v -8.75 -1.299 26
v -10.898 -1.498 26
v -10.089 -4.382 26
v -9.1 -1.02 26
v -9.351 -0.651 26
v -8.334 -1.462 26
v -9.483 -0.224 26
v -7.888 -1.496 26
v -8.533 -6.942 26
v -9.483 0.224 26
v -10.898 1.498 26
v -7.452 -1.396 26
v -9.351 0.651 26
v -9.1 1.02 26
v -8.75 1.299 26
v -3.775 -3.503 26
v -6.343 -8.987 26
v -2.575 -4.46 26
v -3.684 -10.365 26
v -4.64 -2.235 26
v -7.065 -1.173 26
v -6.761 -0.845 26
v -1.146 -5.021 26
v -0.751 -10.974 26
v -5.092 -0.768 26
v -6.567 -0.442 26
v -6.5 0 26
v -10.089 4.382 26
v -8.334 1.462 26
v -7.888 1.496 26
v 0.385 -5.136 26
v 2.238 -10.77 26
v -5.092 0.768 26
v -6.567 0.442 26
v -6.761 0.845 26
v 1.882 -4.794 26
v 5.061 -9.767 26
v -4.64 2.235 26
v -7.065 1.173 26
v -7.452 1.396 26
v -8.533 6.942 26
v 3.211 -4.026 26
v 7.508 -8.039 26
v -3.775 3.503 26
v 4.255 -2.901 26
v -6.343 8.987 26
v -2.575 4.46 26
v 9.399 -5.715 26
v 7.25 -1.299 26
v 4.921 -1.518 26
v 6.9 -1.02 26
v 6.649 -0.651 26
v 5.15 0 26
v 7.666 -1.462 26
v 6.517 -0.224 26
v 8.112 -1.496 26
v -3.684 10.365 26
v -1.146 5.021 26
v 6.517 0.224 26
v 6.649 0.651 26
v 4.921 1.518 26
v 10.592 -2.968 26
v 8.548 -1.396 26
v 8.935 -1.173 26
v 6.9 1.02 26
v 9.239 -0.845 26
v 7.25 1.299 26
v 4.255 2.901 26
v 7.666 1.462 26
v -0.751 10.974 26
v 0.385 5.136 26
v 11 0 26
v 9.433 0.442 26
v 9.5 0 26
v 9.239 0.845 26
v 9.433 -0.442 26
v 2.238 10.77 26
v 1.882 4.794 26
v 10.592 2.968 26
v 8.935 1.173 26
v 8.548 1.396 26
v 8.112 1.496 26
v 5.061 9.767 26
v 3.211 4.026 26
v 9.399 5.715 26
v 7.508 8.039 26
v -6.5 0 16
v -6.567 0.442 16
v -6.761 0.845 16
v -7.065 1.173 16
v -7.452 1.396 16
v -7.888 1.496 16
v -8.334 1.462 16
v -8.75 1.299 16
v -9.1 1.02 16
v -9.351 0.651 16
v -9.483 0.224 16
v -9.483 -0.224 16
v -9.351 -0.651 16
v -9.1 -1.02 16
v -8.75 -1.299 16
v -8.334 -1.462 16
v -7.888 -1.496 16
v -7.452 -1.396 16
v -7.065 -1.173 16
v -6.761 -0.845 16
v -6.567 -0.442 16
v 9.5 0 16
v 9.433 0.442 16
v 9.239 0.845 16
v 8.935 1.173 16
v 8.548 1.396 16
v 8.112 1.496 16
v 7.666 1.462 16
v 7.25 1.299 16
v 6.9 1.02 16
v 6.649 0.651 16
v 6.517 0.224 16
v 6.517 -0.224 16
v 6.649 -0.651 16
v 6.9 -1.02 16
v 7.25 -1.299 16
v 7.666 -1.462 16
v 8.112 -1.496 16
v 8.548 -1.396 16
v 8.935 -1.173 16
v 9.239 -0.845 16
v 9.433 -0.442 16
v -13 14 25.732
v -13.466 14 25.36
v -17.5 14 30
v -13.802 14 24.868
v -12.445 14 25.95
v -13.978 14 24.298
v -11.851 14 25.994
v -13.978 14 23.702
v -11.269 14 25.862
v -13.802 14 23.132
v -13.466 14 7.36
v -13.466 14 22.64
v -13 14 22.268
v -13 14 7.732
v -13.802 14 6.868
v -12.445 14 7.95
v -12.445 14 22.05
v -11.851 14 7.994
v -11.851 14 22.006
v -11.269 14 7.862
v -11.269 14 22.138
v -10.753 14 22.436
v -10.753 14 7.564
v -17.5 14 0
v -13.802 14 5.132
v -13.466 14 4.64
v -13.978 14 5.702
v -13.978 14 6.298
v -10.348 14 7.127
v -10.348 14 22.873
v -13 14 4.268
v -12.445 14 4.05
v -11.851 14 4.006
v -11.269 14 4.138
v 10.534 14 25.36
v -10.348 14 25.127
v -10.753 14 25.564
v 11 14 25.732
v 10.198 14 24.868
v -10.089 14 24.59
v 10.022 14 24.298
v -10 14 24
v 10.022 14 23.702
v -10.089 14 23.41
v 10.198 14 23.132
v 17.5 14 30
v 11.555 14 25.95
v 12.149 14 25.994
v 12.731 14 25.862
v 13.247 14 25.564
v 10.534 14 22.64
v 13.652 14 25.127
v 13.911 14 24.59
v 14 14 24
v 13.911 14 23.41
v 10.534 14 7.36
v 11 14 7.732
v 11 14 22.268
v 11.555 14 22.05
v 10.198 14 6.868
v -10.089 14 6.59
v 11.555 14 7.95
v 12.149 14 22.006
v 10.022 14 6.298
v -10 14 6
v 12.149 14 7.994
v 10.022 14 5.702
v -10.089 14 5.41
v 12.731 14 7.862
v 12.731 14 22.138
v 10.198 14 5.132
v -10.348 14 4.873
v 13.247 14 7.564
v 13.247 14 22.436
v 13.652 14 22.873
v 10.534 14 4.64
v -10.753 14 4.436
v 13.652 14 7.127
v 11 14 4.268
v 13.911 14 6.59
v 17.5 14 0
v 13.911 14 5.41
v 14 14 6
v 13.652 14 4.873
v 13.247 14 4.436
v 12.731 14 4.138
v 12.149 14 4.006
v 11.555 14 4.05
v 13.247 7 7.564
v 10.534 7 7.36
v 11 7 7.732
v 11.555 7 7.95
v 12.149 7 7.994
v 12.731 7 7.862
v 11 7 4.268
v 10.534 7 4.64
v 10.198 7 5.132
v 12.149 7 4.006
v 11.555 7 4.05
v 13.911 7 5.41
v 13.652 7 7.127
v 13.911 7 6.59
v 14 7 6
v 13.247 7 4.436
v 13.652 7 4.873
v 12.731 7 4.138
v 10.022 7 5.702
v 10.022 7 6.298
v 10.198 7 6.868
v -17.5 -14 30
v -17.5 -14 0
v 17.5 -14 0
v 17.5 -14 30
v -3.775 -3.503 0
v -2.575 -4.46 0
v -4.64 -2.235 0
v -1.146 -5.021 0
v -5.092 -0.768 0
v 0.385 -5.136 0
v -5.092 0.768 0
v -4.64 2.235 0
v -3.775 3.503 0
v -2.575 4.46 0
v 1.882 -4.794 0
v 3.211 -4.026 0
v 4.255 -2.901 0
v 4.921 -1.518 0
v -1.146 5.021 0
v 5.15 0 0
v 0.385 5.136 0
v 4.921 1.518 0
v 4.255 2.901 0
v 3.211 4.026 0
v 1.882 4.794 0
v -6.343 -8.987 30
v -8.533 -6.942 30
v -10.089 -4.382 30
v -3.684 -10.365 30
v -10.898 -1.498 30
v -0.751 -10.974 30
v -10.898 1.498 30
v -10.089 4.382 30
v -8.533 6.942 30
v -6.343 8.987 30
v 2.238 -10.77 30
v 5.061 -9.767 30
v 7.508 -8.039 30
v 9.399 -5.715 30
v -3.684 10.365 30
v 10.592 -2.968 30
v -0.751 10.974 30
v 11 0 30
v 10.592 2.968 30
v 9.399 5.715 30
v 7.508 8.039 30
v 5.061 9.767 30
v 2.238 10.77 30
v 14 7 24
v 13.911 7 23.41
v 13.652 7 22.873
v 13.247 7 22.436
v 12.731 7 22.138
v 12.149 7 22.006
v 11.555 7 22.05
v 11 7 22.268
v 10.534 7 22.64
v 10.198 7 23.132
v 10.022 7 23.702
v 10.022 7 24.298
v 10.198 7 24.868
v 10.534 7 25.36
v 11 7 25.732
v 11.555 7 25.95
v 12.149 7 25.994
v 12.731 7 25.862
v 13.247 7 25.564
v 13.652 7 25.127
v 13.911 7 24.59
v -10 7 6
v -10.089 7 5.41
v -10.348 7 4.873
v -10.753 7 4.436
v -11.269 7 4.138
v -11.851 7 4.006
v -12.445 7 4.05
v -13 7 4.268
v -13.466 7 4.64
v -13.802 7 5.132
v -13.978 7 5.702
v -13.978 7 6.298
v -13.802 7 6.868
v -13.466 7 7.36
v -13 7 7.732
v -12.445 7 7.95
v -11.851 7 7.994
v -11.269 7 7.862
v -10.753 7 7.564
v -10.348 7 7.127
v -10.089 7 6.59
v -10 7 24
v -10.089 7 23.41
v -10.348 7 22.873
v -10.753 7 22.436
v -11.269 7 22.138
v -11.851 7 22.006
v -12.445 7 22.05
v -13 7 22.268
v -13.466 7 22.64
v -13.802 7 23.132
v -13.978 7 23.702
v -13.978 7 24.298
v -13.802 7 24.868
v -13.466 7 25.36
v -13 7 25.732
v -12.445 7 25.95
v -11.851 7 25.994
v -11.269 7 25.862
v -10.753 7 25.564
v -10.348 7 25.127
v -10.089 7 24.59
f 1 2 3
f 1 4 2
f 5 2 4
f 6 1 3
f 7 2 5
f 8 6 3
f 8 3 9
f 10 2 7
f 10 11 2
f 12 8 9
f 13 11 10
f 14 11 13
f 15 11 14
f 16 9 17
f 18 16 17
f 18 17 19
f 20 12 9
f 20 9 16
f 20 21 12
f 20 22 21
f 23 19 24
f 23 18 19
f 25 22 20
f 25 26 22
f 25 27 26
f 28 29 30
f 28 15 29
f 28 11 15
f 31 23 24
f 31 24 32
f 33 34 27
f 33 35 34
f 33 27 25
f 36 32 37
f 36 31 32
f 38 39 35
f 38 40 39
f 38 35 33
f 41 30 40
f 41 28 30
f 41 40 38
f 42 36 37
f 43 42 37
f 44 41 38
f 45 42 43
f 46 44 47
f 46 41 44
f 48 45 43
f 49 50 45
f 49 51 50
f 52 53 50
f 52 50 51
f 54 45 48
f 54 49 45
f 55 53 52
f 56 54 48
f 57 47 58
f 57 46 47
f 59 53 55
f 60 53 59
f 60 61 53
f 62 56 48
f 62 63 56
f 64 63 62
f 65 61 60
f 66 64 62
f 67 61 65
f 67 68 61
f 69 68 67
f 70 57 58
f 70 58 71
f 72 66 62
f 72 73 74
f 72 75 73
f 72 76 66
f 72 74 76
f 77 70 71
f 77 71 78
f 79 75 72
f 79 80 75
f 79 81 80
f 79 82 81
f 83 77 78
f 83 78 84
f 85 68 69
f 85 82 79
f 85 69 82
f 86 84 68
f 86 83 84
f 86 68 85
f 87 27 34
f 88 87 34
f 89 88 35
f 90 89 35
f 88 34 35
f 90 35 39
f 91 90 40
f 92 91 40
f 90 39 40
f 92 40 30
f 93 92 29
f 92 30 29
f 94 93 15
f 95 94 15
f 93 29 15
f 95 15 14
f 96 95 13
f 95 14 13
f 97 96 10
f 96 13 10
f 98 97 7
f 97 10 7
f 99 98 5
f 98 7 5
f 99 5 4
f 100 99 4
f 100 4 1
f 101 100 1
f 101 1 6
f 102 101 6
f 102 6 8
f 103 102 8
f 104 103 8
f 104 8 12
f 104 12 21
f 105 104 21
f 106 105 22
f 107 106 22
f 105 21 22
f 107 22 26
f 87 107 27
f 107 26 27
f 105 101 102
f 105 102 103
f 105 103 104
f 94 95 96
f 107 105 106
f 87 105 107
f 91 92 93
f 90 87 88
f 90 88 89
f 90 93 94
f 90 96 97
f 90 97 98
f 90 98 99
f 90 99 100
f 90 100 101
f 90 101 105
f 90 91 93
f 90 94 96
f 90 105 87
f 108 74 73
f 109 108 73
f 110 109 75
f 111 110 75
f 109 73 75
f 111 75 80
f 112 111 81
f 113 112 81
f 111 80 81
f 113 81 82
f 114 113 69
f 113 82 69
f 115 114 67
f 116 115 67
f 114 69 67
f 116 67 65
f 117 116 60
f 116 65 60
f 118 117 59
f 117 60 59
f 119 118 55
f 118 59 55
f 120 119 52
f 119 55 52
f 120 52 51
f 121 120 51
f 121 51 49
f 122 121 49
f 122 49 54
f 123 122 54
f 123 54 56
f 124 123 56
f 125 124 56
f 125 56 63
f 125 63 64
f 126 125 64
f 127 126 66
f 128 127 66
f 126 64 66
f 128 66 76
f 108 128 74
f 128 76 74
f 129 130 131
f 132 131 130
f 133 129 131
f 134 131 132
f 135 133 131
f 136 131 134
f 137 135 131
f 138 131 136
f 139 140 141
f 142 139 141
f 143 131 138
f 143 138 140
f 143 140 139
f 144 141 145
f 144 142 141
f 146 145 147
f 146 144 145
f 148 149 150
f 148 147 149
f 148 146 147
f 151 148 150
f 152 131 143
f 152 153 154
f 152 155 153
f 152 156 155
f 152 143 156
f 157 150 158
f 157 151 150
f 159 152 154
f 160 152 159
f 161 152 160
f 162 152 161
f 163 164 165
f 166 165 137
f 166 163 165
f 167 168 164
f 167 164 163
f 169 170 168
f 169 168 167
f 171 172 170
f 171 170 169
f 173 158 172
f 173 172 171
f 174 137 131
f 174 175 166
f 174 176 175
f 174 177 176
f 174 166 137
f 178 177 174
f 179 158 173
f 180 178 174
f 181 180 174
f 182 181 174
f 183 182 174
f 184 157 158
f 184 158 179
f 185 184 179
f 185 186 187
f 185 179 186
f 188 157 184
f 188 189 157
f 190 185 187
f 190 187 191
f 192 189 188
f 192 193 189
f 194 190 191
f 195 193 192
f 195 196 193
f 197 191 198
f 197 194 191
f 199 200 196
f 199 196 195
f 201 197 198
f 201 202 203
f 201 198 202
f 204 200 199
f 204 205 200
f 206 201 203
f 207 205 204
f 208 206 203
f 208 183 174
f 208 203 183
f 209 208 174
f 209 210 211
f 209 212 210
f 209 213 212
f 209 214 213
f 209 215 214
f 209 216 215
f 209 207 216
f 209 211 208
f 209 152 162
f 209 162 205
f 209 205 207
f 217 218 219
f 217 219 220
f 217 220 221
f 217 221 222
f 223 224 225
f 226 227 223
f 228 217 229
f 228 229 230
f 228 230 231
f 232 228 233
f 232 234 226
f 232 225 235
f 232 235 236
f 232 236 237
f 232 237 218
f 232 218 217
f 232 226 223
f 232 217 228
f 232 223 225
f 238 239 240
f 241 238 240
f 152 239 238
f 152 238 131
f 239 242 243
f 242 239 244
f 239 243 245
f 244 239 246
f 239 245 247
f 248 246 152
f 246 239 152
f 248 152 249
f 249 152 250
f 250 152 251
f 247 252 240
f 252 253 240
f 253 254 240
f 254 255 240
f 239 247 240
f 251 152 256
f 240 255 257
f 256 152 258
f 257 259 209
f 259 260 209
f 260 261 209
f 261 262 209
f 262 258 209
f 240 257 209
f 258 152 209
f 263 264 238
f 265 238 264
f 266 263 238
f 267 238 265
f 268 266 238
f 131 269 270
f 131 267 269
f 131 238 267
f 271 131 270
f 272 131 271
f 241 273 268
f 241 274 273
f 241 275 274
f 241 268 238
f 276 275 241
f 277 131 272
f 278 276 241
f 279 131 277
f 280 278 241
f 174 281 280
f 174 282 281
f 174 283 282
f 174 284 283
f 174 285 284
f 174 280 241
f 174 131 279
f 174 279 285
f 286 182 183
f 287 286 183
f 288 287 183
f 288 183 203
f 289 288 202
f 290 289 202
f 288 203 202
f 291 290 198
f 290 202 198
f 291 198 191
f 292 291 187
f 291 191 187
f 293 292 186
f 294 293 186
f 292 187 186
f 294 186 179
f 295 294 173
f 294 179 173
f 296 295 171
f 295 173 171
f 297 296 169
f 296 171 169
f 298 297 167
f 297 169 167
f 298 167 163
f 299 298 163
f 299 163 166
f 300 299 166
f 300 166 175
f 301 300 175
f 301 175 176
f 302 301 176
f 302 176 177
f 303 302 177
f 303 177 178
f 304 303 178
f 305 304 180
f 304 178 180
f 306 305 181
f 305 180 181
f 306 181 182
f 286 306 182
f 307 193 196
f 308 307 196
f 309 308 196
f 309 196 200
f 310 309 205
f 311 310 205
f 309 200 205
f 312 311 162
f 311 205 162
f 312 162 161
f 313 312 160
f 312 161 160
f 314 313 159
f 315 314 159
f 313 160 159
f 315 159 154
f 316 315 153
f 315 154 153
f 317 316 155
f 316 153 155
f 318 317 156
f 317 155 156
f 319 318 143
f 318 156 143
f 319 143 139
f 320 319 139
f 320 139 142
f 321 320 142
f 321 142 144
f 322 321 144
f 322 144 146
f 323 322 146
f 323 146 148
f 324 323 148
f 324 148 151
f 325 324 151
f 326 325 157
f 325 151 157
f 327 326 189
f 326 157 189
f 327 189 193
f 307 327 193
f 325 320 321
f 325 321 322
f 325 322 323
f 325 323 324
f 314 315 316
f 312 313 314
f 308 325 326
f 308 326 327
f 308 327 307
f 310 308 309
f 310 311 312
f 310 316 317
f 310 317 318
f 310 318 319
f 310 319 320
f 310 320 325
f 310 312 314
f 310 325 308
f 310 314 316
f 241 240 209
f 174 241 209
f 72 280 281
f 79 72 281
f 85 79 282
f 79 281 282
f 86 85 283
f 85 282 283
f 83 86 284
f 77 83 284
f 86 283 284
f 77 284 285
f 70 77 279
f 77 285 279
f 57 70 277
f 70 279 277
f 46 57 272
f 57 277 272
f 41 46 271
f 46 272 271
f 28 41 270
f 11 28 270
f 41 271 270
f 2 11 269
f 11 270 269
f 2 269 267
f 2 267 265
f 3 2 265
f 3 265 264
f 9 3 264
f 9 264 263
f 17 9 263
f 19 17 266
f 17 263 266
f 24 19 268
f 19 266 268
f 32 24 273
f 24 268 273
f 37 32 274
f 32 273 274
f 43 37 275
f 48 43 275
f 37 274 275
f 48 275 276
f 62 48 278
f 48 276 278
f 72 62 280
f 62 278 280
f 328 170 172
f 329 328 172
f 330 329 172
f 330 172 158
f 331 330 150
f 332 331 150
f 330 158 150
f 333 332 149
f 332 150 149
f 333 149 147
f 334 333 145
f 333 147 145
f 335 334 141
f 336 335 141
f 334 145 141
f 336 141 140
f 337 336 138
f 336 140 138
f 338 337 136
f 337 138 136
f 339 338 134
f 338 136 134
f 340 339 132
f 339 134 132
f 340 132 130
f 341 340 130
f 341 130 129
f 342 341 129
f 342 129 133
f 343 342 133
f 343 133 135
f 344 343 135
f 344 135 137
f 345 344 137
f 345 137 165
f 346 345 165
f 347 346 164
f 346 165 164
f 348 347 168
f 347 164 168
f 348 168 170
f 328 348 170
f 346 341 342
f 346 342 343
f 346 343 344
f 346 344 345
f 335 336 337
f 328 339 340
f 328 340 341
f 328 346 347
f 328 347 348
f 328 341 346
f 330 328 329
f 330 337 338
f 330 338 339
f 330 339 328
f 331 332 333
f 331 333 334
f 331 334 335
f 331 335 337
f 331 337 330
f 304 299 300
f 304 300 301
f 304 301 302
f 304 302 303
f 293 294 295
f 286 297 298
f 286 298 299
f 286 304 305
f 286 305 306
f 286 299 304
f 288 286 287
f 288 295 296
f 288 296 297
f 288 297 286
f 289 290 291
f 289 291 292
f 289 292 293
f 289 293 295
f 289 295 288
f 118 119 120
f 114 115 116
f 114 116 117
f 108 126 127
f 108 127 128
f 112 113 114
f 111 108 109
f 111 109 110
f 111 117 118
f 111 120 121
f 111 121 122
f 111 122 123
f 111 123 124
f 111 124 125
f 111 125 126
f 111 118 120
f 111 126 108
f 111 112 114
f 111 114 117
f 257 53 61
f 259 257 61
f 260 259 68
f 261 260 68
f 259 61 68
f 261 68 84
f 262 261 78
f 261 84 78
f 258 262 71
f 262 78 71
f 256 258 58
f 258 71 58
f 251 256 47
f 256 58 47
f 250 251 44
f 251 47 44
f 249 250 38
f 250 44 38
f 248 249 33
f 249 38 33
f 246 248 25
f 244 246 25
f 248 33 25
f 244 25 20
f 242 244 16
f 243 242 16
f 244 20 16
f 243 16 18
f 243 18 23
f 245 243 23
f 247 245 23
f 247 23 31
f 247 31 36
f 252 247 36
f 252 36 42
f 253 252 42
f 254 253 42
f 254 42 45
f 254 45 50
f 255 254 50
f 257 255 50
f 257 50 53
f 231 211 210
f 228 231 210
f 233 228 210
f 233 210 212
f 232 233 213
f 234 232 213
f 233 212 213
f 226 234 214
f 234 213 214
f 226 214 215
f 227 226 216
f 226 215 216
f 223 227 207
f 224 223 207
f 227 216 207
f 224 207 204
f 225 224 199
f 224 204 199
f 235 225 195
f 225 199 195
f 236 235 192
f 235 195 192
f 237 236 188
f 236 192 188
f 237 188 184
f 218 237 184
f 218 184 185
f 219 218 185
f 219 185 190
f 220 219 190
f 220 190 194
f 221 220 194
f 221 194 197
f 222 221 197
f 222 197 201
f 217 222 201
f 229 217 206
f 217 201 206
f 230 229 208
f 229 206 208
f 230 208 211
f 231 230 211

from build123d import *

# Parameters (mm, degrees)
ESBO_O1_W                = 35
ESBO_O1_H                = 28
RESSALTO_EXTRUS_O1_DEPTH = 30
ESBO_O2_R                = 5.15
CORTE_EXTRUS_O1_DEPTH    = 31
ESBO_O3_R                = 11
CORTE_EXTRUS_O2_DEPTH    = 4
ESBO_O4_R                = 1.5
CORTE_EXTRUS_O3_DEPTH    = 10
ESBO_O6_R                = 2
CORTE_EXTRUS_O4_DEPTH    = 7


with BuildPart() as part:
    # Esboço1 → Ressalto-extrusão1 (new body)
    with BuildSketch(Plane.XY):
        Rectangle(ESBO_O1_W, ESBO_O1_H)
    extrude(amount=RESSALTO_EXTRUS_O1_DEPTH)

    # Esboço2 → Corte-extrusão1 (cut, through all)
    with BuildSketch(Plane.XY.offset(30)):
        Circle(ESBO_O2_R)
    extrude(amount=-CORTE_EXTRUS_O1_DEPTH, mode=Mode.SUBTRACT)

    # Esboço3 → Corte-extrusão2 (cut)
    with BuildSketch(Plane.XY.offset(30)):
        Circle(ESBO_O3_R)
    extrude(amount=-CORTE_EXTRUS_O2_DEPTH, mode=Mode.SUBTRACT)

    # Esboço4 → Corte-extrusão3 (cut)
    with BuildSketch(Plane.XY.offset(26)):
        with Locations((-8, 0)):
            Circle(ESBO_O4_R)
        with Locations((8, 0)):
            Circle(ESBO_O4_R)
    extrude(amount=-CORTE_EXTRUS_O3_DEPTH, mode=Mode.SUBTRACT)

    # Esboço6 → Corte-extrusão4 (cut)
    with BuildSketch(Plane(origin=(0, 14, 0), x_dir=(1, 0, 0), z_dir=(0, 1, 0))):
        with Locations((-12, -24)):
            Circle(ESBO_O6_R)
        with Locations((12, -24)):
            Circle(ESBO_O6_R)
        with Locations((12, -6)):
            Circle(ESBO_O6_R)
        with Locations((-12, -6)):
            Circle(ESBO_O6_R)
    extrude(amount=-CORTE_EXTRUS_O4_DEPTH, mode=Mode.SUBTRACT)


solid = part.part
